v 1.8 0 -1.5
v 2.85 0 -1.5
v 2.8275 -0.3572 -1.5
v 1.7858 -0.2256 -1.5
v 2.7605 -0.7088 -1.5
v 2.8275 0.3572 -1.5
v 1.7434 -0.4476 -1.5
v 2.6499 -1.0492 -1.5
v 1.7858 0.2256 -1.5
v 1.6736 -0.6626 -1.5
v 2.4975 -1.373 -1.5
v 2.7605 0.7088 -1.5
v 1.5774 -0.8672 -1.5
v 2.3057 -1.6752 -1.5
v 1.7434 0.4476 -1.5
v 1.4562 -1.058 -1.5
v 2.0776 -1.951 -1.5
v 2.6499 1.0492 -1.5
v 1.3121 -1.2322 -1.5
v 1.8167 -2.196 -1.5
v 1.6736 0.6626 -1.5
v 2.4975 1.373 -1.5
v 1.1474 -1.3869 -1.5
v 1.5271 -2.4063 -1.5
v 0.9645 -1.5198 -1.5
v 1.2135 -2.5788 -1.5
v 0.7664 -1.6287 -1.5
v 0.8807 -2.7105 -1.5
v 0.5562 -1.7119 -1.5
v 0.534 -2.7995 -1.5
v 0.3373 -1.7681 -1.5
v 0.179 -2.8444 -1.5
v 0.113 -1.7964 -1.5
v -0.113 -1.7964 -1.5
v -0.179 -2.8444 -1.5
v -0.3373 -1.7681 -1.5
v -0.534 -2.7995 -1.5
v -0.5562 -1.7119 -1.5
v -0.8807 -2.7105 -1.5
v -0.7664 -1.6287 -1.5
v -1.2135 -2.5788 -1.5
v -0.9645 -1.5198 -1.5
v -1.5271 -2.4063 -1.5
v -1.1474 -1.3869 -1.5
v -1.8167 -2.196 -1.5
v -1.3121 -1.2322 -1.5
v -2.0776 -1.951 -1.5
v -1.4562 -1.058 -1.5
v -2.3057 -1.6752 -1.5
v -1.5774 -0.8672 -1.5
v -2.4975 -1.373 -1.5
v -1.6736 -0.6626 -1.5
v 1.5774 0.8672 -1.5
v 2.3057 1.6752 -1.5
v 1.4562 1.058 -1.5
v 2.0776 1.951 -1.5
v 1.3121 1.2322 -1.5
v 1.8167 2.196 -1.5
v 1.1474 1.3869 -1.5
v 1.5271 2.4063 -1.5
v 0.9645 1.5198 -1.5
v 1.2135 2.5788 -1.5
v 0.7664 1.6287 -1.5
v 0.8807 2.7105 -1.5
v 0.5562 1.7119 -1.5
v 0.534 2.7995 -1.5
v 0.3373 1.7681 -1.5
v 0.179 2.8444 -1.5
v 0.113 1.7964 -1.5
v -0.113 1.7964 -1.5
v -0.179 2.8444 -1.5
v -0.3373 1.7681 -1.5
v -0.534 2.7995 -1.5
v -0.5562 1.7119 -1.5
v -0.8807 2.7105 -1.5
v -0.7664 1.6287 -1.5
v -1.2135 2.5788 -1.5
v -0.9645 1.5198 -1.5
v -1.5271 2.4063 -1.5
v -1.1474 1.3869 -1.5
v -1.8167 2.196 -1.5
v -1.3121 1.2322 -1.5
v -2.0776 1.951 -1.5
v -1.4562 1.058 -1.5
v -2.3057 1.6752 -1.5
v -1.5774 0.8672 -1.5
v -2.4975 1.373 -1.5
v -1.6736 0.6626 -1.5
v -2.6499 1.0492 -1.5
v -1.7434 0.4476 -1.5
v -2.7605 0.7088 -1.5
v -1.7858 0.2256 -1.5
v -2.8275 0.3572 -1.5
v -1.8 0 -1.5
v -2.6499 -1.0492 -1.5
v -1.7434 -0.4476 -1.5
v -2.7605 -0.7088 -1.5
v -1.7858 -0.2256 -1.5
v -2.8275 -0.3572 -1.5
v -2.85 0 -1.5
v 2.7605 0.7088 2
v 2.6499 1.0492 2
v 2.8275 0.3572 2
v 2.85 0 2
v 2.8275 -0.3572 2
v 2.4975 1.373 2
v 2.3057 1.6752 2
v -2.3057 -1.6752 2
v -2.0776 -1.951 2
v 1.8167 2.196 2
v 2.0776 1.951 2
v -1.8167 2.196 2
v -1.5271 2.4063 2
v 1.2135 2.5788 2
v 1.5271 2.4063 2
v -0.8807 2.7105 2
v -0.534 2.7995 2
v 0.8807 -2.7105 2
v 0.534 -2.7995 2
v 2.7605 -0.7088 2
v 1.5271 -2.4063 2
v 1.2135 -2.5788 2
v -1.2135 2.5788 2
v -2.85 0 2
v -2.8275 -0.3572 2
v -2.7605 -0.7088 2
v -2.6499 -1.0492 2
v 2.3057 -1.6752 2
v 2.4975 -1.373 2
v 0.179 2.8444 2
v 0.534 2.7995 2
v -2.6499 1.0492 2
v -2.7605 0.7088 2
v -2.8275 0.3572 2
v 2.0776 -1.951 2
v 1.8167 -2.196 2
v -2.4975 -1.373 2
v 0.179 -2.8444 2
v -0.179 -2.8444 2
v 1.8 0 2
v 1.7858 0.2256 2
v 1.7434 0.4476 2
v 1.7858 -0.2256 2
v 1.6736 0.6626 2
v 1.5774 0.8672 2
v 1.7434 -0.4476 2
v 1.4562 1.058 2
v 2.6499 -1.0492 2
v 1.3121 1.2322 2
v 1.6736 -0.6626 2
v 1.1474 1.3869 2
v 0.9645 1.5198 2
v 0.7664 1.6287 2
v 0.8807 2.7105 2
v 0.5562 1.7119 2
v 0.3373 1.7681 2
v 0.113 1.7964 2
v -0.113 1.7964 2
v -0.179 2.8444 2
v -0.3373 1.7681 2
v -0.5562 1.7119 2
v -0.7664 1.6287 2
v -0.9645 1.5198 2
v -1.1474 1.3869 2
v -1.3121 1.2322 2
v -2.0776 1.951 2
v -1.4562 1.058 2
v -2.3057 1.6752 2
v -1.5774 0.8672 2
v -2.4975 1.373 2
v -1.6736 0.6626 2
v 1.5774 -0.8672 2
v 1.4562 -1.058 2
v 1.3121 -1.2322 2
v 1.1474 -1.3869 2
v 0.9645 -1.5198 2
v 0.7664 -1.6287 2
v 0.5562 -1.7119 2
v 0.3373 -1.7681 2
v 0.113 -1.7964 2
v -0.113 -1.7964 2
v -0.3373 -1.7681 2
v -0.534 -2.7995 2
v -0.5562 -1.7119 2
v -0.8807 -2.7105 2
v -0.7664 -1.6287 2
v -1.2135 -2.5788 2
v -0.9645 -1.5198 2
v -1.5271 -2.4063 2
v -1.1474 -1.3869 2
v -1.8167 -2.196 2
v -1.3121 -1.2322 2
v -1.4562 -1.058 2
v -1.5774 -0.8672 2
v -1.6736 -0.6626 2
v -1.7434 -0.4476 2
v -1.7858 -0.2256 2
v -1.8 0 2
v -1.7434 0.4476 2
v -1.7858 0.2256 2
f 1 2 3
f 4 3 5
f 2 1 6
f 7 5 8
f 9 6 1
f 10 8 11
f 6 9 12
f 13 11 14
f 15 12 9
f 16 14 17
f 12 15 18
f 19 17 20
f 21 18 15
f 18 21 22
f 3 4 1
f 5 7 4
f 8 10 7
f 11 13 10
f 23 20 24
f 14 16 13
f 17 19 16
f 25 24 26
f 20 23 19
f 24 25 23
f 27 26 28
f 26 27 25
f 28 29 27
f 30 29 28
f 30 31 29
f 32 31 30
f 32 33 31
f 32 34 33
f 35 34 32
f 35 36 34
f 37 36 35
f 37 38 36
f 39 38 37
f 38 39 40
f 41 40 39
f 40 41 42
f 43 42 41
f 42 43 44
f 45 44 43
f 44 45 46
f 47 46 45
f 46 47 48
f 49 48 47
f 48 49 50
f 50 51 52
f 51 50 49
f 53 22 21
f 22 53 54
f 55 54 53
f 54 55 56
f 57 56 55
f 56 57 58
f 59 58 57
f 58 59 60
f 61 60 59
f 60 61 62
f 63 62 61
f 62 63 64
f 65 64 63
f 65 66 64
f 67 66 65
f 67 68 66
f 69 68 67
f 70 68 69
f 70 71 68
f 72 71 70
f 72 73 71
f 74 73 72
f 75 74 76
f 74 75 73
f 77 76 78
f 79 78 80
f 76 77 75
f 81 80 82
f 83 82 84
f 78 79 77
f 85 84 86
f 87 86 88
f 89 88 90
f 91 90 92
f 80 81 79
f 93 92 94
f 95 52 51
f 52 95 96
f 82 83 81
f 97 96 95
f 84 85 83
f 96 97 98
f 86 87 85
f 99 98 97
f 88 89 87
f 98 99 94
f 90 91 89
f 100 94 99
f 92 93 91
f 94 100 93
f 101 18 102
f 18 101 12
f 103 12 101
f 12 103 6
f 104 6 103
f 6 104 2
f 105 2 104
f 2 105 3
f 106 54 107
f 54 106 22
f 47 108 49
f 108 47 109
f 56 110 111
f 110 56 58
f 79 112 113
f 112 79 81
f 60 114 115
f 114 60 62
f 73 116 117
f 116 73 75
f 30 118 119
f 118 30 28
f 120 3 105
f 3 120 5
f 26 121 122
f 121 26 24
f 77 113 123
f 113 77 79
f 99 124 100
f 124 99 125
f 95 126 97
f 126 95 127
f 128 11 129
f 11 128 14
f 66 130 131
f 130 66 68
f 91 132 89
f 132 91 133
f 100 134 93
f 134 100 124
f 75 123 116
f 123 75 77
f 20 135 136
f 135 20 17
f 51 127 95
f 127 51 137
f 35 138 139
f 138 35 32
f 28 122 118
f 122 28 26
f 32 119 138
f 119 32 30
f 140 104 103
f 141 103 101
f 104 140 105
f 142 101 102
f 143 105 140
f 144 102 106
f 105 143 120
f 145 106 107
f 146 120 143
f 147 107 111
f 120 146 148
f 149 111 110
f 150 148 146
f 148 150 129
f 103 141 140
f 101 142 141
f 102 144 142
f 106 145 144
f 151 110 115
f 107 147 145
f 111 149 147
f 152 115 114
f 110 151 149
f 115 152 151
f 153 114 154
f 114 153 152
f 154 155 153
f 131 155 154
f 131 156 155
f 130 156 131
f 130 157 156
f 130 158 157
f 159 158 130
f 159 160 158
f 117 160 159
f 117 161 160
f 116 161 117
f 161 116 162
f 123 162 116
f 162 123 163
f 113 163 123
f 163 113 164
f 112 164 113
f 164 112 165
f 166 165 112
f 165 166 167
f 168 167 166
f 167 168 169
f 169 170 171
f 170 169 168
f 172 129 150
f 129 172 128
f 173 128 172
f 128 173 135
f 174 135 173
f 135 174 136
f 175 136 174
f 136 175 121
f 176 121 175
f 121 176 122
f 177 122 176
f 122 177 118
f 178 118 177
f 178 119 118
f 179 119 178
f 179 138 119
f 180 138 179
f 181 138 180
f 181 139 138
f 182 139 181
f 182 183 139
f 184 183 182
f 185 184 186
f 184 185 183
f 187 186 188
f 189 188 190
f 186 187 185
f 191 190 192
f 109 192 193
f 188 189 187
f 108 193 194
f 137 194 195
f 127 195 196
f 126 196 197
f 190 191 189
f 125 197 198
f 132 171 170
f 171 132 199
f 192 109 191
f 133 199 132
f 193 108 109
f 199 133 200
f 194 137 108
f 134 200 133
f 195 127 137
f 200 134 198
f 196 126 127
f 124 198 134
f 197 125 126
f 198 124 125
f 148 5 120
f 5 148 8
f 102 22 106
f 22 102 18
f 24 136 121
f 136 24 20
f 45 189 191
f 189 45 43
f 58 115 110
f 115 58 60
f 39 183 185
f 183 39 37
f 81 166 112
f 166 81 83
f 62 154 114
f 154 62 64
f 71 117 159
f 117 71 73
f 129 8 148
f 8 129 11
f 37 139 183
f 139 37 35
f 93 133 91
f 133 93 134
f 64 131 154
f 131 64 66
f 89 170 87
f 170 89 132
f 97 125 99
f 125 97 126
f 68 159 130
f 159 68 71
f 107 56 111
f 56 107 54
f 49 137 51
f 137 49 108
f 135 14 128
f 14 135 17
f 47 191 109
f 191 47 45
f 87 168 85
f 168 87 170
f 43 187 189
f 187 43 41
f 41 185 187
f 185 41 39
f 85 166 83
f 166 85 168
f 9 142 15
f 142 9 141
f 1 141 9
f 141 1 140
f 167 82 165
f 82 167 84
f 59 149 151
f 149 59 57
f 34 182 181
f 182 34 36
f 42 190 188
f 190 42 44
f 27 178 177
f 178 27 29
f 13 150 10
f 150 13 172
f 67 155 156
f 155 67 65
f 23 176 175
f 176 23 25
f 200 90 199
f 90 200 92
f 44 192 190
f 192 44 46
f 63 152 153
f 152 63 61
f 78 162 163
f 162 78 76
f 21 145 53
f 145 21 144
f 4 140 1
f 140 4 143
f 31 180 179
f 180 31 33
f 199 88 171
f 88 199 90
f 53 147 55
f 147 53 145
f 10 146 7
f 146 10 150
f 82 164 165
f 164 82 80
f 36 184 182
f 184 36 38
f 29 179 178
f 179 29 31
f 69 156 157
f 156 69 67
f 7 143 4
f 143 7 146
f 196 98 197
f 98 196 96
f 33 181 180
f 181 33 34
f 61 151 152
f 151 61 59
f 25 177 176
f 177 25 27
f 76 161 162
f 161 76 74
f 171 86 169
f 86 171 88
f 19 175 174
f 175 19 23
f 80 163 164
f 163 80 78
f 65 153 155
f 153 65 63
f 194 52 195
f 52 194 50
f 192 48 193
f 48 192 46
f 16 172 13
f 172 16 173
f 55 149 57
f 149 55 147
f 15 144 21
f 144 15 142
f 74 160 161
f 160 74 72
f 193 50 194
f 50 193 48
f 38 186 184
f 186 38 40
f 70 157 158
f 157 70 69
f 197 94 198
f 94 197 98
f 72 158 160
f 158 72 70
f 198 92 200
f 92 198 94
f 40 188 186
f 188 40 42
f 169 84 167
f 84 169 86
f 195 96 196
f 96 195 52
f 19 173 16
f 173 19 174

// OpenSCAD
$fn = 50;


difference() {
	union() {
		translate(v = [0, 0, -1.5000000000]) {
			cylinder(h = 3, r = 1.0000000000);
		}
		translate(v = [0, 0, -1.5000000000]) {
			cylinder(h = 3.5000000000, r = 2.8500000000);
		}
	}
	union() {
		translate(v = [0, 0, -50.0000000000]) {
			cylinder(h = 100, r = 1.8000000000);
		}
	}
}
